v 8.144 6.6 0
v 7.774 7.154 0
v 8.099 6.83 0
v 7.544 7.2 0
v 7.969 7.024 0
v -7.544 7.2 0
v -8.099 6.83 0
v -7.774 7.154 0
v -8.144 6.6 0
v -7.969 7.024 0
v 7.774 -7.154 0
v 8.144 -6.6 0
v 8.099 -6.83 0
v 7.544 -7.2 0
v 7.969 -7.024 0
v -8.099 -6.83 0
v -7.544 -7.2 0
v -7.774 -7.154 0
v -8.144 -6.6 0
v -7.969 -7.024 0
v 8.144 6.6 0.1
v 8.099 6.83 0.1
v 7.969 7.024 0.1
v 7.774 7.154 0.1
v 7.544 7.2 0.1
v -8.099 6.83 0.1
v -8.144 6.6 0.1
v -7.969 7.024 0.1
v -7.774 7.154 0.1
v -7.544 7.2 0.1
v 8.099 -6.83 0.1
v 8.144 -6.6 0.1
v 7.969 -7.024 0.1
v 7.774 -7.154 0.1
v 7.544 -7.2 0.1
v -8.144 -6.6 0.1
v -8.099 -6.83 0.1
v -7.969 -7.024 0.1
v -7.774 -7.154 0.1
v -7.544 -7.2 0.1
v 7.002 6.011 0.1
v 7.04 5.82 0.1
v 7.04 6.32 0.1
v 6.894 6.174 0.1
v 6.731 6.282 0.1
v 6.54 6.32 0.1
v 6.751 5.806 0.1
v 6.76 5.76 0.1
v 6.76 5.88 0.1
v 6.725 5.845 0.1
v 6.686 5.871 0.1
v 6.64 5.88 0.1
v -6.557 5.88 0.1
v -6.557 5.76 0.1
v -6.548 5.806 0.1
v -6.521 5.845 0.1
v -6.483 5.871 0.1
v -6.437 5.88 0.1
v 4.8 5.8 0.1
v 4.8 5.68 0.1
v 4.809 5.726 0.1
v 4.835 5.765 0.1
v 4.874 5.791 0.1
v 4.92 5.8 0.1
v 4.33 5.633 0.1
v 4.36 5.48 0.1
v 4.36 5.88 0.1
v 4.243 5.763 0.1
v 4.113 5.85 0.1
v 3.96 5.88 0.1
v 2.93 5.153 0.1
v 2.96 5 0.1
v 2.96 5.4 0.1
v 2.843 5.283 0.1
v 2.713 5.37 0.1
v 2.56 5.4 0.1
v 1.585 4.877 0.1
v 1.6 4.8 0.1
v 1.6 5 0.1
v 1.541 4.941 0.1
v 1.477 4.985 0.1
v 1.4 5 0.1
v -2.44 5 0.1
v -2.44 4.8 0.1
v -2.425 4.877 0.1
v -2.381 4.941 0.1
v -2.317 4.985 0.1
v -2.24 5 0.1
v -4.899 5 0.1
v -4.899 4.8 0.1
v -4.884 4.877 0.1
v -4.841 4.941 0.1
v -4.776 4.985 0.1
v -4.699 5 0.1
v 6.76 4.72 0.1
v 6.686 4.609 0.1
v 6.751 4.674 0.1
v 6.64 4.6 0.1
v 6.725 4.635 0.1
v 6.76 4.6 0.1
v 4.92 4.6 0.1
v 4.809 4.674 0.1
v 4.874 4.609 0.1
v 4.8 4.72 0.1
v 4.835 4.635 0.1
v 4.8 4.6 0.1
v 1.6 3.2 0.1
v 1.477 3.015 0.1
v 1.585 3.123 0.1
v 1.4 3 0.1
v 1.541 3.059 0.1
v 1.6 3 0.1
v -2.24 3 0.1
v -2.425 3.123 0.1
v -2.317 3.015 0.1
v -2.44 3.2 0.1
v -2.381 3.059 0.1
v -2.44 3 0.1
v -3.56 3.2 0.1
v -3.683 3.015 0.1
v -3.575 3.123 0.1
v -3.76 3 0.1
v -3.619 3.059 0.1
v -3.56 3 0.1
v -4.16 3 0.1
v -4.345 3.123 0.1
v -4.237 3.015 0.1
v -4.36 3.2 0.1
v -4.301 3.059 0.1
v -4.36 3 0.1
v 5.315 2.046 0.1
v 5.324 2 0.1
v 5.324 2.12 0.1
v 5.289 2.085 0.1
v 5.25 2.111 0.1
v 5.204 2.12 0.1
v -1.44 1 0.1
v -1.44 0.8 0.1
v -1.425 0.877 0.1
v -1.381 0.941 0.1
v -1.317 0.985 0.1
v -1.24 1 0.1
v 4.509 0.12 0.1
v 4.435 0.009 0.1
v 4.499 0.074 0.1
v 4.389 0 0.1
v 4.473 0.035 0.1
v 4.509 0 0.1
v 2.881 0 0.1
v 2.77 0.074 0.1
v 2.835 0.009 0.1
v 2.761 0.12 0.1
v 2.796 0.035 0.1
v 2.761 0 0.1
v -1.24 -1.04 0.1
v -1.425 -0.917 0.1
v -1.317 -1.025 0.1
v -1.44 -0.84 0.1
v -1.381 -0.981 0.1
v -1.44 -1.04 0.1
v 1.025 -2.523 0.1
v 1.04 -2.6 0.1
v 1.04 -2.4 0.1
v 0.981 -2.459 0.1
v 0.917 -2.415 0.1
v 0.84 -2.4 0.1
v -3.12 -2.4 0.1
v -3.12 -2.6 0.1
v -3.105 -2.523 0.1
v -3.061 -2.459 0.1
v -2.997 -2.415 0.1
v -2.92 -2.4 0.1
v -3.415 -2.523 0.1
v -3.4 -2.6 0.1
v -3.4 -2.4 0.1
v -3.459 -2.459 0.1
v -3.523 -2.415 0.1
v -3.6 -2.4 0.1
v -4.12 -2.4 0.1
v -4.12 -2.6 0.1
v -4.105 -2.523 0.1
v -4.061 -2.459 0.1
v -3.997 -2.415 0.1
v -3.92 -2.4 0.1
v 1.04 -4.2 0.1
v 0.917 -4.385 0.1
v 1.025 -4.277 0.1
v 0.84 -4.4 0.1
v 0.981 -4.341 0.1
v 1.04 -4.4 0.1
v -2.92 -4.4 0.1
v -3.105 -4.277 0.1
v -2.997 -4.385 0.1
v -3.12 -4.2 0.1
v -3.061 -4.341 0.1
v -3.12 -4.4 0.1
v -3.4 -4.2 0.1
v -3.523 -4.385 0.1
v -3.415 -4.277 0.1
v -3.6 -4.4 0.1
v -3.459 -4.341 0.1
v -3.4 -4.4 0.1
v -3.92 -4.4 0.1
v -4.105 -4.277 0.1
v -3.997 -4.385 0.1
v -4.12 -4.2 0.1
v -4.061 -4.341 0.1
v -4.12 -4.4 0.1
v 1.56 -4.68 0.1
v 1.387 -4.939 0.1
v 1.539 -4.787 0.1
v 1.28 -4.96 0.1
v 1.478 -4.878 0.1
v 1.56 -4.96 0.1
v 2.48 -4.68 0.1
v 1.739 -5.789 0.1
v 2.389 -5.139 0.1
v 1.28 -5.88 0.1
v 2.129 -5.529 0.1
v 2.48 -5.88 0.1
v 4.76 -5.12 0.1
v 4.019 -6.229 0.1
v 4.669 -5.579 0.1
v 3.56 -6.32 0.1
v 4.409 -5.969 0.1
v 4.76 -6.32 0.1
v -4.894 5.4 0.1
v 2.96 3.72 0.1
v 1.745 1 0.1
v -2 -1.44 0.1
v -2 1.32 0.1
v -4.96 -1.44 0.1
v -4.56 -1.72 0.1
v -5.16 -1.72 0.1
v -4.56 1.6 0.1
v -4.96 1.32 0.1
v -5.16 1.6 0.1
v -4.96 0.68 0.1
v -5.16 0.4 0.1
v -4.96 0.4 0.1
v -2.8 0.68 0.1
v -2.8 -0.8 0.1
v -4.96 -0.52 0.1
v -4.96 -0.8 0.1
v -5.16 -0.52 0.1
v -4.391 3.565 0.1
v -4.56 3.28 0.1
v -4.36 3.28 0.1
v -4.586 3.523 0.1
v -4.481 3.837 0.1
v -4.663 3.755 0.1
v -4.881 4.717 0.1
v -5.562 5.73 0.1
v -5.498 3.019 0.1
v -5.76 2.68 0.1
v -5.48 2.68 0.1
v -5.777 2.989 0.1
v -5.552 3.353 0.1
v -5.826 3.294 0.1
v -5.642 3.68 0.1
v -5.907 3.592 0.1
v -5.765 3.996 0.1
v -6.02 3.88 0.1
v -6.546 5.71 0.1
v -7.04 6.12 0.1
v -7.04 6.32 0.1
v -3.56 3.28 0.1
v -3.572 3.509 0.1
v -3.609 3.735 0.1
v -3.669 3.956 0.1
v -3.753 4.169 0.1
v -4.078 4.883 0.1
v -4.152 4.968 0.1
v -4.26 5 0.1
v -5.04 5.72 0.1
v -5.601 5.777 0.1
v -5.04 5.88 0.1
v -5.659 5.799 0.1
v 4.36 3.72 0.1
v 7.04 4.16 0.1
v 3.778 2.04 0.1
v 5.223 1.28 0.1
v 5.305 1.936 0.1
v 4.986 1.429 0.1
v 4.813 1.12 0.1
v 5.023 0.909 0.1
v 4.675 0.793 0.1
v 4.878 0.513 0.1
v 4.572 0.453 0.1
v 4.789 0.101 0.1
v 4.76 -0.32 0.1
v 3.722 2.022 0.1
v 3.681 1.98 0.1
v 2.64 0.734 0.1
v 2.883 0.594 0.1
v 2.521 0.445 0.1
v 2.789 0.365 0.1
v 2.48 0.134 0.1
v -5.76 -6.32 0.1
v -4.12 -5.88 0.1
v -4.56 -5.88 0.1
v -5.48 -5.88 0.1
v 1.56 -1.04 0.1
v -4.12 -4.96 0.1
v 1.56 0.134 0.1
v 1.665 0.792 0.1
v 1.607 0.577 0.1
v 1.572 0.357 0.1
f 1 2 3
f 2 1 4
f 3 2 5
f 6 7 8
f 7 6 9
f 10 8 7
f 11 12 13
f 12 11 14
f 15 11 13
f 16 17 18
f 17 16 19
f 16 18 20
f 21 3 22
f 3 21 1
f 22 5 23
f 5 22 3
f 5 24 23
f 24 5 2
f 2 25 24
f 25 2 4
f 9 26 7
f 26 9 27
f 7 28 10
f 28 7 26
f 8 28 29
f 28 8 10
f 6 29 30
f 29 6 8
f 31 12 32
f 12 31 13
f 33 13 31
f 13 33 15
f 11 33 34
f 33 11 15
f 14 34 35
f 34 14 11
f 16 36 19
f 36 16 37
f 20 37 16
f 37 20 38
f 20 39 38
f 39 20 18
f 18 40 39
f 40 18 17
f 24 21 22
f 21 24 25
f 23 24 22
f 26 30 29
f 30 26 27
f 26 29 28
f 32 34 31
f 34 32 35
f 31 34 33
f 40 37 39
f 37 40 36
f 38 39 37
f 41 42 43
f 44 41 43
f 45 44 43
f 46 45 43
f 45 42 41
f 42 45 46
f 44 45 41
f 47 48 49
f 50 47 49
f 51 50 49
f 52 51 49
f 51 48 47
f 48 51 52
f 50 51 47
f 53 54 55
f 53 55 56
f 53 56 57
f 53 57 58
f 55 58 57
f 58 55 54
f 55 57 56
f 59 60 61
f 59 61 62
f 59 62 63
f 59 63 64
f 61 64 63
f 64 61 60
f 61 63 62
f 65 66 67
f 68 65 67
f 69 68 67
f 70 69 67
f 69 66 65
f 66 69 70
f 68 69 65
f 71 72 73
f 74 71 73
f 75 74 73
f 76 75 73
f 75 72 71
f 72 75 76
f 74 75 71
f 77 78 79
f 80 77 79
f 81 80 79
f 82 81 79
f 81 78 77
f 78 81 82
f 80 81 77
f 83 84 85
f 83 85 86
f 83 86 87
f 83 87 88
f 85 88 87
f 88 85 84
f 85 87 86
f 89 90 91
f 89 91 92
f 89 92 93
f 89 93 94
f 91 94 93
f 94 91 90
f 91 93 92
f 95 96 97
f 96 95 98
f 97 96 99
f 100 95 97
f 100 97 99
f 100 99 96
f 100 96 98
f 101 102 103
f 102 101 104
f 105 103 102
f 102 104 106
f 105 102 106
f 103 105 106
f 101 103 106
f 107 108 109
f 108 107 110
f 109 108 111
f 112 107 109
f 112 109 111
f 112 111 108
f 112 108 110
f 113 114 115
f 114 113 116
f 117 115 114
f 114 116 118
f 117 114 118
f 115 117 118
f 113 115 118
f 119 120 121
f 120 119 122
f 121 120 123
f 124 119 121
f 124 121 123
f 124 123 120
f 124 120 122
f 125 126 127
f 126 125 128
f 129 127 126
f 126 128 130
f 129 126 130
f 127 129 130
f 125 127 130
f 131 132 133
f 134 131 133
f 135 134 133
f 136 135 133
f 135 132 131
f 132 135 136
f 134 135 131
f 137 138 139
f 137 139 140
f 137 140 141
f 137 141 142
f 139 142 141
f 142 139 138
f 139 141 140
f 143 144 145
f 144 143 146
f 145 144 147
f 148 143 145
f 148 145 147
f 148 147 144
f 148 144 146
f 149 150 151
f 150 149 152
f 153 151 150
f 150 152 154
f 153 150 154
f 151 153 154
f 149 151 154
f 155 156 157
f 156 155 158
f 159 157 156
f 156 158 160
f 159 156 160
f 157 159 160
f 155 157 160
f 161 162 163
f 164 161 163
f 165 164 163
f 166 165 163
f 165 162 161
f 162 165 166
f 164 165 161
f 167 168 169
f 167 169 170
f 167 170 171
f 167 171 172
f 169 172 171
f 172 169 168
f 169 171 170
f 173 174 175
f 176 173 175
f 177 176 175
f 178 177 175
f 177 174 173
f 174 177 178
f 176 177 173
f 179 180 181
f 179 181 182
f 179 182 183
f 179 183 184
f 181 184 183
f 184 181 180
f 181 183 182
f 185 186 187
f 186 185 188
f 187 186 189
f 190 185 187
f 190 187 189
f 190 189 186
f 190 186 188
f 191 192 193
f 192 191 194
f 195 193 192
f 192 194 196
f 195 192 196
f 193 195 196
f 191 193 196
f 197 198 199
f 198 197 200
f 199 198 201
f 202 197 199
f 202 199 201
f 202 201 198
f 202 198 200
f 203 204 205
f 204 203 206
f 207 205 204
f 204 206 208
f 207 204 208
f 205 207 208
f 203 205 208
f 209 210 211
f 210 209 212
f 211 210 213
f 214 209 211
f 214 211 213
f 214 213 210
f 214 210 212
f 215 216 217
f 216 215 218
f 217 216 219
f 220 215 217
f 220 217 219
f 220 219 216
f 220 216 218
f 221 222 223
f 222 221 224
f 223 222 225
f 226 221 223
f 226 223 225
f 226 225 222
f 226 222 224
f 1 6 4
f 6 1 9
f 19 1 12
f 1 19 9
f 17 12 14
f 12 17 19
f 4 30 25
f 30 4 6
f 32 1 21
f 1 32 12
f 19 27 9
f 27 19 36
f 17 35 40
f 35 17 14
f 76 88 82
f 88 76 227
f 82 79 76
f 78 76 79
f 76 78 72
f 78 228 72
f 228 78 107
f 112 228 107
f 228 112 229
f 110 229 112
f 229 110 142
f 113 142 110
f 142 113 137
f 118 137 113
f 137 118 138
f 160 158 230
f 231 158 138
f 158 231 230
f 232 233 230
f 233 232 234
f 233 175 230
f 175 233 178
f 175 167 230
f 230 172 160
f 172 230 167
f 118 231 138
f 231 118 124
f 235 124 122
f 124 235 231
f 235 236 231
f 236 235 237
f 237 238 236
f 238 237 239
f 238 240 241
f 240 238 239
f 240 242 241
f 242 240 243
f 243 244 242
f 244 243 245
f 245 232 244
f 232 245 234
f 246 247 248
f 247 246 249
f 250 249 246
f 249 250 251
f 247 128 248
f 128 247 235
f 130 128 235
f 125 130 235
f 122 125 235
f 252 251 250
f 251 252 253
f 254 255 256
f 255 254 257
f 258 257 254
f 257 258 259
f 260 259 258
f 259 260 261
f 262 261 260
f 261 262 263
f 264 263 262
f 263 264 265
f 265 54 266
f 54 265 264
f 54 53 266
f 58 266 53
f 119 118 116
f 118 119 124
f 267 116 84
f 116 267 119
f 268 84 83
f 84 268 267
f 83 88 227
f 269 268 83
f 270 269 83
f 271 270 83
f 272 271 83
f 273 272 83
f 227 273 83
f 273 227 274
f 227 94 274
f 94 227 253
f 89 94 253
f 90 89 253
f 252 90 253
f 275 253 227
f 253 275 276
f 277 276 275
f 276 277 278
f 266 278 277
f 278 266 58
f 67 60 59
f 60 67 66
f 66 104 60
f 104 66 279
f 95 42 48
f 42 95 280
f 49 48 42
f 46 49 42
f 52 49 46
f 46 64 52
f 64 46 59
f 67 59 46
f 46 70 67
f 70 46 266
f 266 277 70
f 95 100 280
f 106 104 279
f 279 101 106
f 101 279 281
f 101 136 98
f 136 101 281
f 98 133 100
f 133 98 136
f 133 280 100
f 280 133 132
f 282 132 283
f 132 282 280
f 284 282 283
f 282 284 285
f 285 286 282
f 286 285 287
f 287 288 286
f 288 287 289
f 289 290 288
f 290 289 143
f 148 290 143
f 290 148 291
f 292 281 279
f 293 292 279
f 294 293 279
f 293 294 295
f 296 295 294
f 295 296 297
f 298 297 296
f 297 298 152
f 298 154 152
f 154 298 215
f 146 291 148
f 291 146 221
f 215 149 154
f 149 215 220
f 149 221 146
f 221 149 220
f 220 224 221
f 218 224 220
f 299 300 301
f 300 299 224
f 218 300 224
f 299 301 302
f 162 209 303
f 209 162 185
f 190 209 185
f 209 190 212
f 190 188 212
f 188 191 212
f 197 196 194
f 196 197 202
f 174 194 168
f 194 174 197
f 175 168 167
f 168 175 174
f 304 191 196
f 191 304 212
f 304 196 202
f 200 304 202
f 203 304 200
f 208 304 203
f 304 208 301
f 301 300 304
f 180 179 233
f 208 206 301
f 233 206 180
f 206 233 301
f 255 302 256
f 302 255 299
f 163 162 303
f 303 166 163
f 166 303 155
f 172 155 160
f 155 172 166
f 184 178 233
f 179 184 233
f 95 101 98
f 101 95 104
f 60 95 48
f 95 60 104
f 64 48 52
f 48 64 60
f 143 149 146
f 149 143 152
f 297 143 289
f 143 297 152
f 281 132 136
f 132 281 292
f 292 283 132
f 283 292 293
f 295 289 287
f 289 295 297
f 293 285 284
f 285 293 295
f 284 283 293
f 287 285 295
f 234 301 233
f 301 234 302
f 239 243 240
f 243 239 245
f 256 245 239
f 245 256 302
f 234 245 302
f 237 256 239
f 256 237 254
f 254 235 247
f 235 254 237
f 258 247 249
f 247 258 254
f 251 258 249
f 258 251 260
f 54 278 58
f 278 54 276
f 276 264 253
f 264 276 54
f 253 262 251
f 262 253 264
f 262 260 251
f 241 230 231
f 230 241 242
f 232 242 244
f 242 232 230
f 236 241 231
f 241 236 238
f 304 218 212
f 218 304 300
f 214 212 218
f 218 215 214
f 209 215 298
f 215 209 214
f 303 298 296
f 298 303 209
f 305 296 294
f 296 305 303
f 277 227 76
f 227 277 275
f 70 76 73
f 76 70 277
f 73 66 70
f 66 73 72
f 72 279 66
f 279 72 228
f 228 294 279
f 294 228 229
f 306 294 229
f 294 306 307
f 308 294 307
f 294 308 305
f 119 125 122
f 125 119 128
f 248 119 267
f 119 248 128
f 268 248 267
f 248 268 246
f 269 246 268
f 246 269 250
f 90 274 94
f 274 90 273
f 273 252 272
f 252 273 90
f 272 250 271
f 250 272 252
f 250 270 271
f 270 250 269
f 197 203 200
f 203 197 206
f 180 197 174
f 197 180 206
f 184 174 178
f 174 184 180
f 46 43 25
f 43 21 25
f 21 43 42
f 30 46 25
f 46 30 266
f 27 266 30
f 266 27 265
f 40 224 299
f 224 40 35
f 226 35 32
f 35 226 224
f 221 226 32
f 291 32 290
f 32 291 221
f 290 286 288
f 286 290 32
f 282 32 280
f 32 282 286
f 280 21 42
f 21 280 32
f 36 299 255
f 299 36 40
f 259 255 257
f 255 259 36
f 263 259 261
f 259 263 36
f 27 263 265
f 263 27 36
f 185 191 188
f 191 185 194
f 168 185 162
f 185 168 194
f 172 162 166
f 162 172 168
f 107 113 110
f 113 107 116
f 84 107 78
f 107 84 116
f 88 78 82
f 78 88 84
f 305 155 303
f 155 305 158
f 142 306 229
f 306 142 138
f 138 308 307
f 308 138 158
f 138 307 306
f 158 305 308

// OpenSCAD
// file: ../p/1-4ndis.scad
use <../lib.scad>
function ldraw_lib__1_4ndis() = [
// 0 Disc Negative 0.25
// 0 Name: 1-4ndis.dat
// 0 Author: James Jessiman
// 0 !LDRAW_ORG Primitive UPDATE 2012-01
// 0 !LICENSE Licensed under CC BY 4.0 : see CAreadme.txt
// 
// 0 BFC CERTIFY CCW
  [0,"BFC","CERTIFY"],
  [0,"BFC","CCW"],
// 
// 0 !HISTORY 2002-03-23 [sbliss] Added BFC Statement
// 0 !HISTORY 2002-04-25 [PTadmin] Official Update 2002-02
// 0 !HISTORY 2007-06-22 [PTadmin] Header formatted for Contributor Agreement
// 0 !HISTORY 2008-07-01 [PTadmin] Official Update 2008-01
// 0 !HISTORY 2012-02-16 [Philo] Changed to CCW
// 0 !HISTORY 2012-03-30 [PTadmin] Official Update 2012-01
// 
// 
// 3 16 0.9239 0 0.3827 1 0 0 1 0 1
  [3,16,0.9239,0,0.3827,1,0,0,1,0,1],
// 3 16 0.7071 0 0.7071 0.9239 0 0.3827 1 0 1
  [3,16,0.7071,0,0.7071,0.9239,0,0.3827,1,0,1],
// 3 16 0.3827 0 0.9239 0.7071 0 0.7071 1 0 1
  [3,16,0.3827,0,0.9239,0.7071,0,0.7071,1,0,1],
// 3 16 0 0 1 0.3827 0 0.9239 1 0 1
  [3,16,0,0,1,0.3827,0,0.9239,1,0,1],
];
module ldraw_lib__1_4ndis(step=0, col=false, unit=2/5, alt=false, line=0.2, solid=!$preview)
    makepoly(ldraw_lib__1_4ndis(), step=step, col=col, unit=unit, alt=alt, line=line, solid=solid);
ldraw_lib__1_4ndis(line=0.2);
// file: ../p/1-4cyli.scad
use <../lib.scad>
function ldraw_lib__1_4cyli() = [
// 0 Cylinder 0.25
// 0 Name: 1-4cyli.dat
// 0 Author: James Jessiman
// 0 !LDRAW_ORG Primitive UPDATE 2012-01
// 0 !LICENSE Licensed under CC BY 4.0 : see CAreadme.txt
// 
// 0 BFC CERTIFY CCW
  [0,"BFC","CERTIFY"],
  [0,"BFC","CCW"],
// 
// 0 !HISTORY 2002-03-23 [sbliss] Added BFC statement.
// 0 !HISTORY 2002-04-25 [PTadmin] Official Update 2002-02
// 0 !HISTORY 2007-06-22 [PTadmin] Header formatted for Contributor Agreement
// 0 !HISTORY 2008-07-01 [PTadmin] Official Update 2008-01
// 0 !HISTORY 2012-02-16 [Philo] Changed to CCW
// 0 !HISTORY 2012-03-30 [PTadmin] Official Update 2012-01
// 
// 
// 4 16 1 1 0 0.9239 1 0.3827 0.9239 0 0.3827 1 0 0
  [4,16,1,1,0,0.9239,1,0.3827,0.9239,0,0.3827,1,0,0],
// 5 24 1 0 0 1 1 0 0.9239 0 0.3827 1 0 -1
  [5,24,1,0,0,1,1,0,0.9239,0,0.3827,1,0,-1],
// 4 16 0.9239 1 0.3827 0.7071 1 0.7071 0.7071 0 0.7071 0.9239 0 0.3827
  [4,16,0.9239,1,0.3827,0.7071,1,0.7071,0.7071,0,0.7071,0.9239,0,0.3827],
// 5 24 0.9239 0 0.3827 0.9239 1 0.3827 0.7071 0 0.7071 1 0 0
  [5,24,0.9239,0,0.3827,0.9239,1,0.3827,0.7071,0,0.7071,1,0,0],
// 4 16 0.7071 1 0.7071 0.3827 1 0.9239 0.3827 0 0.9239 0.7071 0 0.7071
  [4,16,0.7071,1,0.7071,0.3827,1,0.9239,0.3827,0,0.9239,0.7071,0,0.7071],
// 5 24 0.7071 0 0.7071 0.7071 1 0.7071 0.3827 0 0.9239 0.9239 0 0.3827
  [5,24,0.7071,0,0.7071,0.7071,1,0.7071,0.3827,0,0.9239,0.9239,0,0.3827],
// 4 16 0.3827 1 0.9239 0 1 1 0 0 1 0.3827 0 0.9239
  [4,16,0.3827,1,0.9239,0,1,1,0,0,1,0.3827,0,0.9239],
// 5 24 0.3827 0 0.9239 0.3827 1 0.9239 0 0 1 0.7071 0 0.7071
  [5,24,0.3827,0,0.9239,0.3827,1,0.9239,0,0,1,0.7071,0,0.7071],
// 5 24 0 0 1 0 1 1 0.3827 0 0.9239 -1 0 1
  [5,24,0,0,1,0,1,1,0.3827,0,0.9239,-1,0,1],
];
module ldraw_lib__1_4cyli(step=0, col=false, unit=2/5, alt=false, line=0.2, solid=!$preview)
    makepoly(ldraw_lib__1_4cyli(), step=step, col=col, unit=unit, alt=alt, line=line, solid=solid);
ldraw_lib__1_4cyli(line=0.2);
// file: ../p/1-4chrd.scad
use <../lib.scad>
function ldraw_lib__1_4chrd() = [
// 0 Chord 0.25
// 0 Name: 1-4chrd.dat
// 0 Author: Tony Hafner [hafhead]
// 0 !LDRAW_ORG Primitive UPDATE 2012-02
// 0 !LICENSE Licensed under CC BY 2.0 and CC BY 4.0 : see CAreadme.txt
// 
// 0 BFC CERTIFY CCW
  [0,"BFC","CERTIFY"],
  [0,"BFC","CCW"],
// 
// 0 !HISTORY 2004-04-22 [PTadmin] Official Update 2004-02
// 0 !HISTORY 2007-10-09 [PTadmin] Header formatted for Contributor Agreement
// 0 !HISTORY 2008-07-01 [PTadmin] Official Update 2008-01
// 0 !HISTORY 2012-08-02 [MMR1988] Re-creation with PrimGen2 and Rectifier
// 0 !HISTORY 2012-08-09 [PTadmin] Official Update 2012-02
// 
// 
// 4 16 0.9239 0 0.3827 0.3827 0 0.9239 0 0 1 1 0 0
  [4,16,0.9239,0,0.3827,0.3827,0,0.9239,0,0,1,1,0,0],
// 3 16 0.7071 0 0.7071 0.3827 0 0.9239 0.9239 0 0.3827
  [3,16,0.7071,0,0.7071,0.3827,0,0.9239,0.9239,0,0.3827],
];
module ldraw_lib__1_4chrd(step=0, col=false, unit=2/5, alt=false, line=0.2, solid=!$preview)
    makepoly(ldraw_lib__1_4chrd(), step=step, col=col, unit=unit, alt=alt, line=line, solid=solid);
ldraw_lib__1_4chrd(line=0.2);
// main file
use <../lib.scad>
use <6141875k.scad>
function ldraw_lib__6141875m() = [
// 0 Sticker  1.8 x  2.0 with Headlamp on Blue Background Left
// 0 Name: 6141875m.dat
// 0 Author: Massimo Maso [Sirio]
// 0 !LDRAW_ORG Part UPDATE 2022-06
// 0 !LICENSE Licensed under CC BY 4.0 : see CAreadme.txt
// 
// 0 BFC CERTIFY CCW
  [0,"BFC","CERTIFY"],
  [0,"BFC","CCW"],
// 
// 0 !KEYWORDS Bricklink 75875stk01, Brickowl 53567, F-150, Ford, Raptor
// 0 !KEYWORDS Rebrickable 24760, Set 75875, Speed Champions
// 
// 0 !HISTORY 2022-12-20 [PTadmin] Official Update 2022-06
// 
// 
// 1 16 0 0 0 -1 0 0 0 1 0 0 0 1 6141875k.dat
  [1,16,0,0,0,-1,0,0,0,1,0,0,0,1, ldraw_lib__6141875k()],
];
module ldraw_lib__6141875m(step=0, col=false, unit=2/5, alt=false, line=0.2, solid=!$preview)
    makepoly(ldraw_lib__6141875m(), step=step, col=col, unit=unit, alt=alt, line=line, solid=solid);
ldraw_lib__6141875m(line=0.2);
